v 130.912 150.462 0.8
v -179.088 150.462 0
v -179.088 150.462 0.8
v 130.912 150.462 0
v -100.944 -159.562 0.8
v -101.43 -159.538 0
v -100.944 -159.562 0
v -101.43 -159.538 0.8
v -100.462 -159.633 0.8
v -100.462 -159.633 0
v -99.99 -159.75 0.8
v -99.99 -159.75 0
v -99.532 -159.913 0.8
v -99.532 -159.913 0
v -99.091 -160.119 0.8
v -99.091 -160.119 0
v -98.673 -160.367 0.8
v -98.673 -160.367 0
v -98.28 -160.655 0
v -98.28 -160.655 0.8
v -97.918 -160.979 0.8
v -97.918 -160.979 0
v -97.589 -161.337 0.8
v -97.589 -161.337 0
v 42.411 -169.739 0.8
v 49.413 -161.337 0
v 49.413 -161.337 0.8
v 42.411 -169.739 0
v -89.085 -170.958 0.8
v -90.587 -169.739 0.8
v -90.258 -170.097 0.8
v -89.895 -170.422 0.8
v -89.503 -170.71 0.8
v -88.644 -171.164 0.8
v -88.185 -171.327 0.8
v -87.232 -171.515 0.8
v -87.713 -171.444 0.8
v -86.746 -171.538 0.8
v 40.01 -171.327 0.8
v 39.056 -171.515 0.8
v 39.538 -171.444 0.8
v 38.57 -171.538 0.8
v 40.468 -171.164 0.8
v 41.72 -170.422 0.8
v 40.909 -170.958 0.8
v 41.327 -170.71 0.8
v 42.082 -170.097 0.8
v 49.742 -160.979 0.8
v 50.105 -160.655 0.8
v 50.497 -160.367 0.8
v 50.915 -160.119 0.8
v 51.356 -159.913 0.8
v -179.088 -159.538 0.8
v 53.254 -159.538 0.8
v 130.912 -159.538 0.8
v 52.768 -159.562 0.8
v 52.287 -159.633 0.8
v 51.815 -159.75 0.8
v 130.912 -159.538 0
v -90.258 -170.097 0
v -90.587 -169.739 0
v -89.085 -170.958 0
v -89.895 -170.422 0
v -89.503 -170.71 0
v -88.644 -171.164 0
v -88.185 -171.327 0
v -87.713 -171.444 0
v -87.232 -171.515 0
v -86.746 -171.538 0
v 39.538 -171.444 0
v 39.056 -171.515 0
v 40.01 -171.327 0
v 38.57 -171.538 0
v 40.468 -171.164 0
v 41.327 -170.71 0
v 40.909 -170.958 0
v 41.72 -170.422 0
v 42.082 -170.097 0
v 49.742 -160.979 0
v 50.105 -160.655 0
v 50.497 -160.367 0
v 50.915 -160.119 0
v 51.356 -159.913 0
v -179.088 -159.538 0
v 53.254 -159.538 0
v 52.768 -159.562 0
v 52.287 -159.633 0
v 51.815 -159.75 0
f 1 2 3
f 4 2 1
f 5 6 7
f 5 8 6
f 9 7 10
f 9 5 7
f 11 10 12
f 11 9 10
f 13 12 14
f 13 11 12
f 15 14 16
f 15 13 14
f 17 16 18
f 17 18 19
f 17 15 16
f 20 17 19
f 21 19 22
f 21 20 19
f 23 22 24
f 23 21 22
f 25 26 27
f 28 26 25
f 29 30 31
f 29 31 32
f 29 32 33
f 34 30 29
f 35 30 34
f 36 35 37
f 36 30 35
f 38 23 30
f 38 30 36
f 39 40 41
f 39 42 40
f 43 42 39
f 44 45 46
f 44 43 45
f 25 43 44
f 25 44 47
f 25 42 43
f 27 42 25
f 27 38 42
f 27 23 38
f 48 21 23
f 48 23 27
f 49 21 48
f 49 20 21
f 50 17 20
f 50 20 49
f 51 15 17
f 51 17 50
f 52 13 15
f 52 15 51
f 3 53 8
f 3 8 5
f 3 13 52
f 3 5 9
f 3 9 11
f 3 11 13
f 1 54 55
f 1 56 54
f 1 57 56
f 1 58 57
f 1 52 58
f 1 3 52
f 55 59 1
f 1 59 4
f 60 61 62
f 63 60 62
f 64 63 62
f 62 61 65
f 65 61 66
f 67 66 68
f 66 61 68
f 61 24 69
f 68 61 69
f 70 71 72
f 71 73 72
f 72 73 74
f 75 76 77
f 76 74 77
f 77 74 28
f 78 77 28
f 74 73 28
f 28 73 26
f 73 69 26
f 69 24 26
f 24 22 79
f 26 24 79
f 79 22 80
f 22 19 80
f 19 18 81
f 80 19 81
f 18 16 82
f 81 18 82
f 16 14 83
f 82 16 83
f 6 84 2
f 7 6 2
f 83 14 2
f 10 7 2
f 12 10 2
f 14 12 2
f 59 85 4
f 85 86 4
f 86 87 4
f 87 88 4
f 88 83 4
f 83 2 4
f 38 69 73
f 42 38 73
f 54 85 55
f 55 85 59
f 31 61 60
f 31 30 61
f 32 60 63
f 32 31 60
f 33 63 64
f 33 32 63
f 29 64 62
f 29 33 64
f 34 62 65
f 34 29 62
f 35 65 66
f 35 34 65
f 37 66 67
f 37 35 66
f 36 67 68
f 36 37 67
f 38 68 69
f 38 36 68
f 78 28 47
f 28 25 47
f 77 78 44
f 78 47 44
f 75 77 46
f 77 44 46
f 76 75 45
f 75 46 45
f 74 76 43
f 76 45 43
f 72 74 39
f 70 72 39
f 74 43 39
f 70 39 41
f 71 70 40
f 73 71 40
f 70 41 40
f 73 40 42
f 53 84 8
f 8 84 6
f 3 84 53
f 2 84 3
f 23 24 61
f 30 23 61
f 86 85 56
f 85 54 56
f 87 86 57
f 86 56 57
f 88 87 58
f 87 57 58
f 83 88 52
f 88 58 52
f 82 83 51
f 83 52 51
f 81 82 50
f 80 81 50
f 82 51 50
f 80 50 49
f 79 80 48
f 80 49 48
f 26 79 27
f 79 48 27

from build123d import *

# Parameters (mm, degrees)
SKETCH_1_W          = 310
SKETCH_1_H          = 310
SKETCH_1_W_2        = 150
SKETCH_1_H_2        = 12
EXTRUDE_1_DEPTH     = 0.8
CUT_EXTRUDE_1_DEPTH = 0.8
FILLET_1_R          = 5


with BuildPart() as part:
    # 草图1 → 凸台-拉伸1 (new body)
    with BuildSketch(Plane.XY):
        with Locations((-24.087837838, -4.538288288)):
            Rectangle(SKETCH_1_W, SKETCH_1_H)
        with Locations((-24.087837838, -165.538288288)):
            Rectangle(SKETCH_1_W_2, SKETCH_1_H_2)
    extrude(amount=EXTRUDE_1_DEPTH)

    # 草图2 → 切除-拉伸1 (cut)
    with BuildSketch(Plane(origin=(0, 0, 0), x_dir=(-1, 0, 0), z_dir=(0, 0, -1))):
        Polygon((99.087837838, -159.538288288), (89.087837838, -171.538288288), (99.087837838, -171.538288288), align=None)
        Polygon((-50.912162162, -159.538288288), (-40.912162162, -171.538288288), (-50.912162162, -171.538288288), align=None)
    extrude(amount=-CUT_EXTRUDE_1_DEPTH, mode=Mode.SUBTRACT)

    # 圆角1
    fillet_1_edges = [part.edges().sort_by_distance(p)[0] for p in [
        (50.912162162, -159.538288288, 0.4),
        (-99.087837838, -159.538288288, 0.4),
        (-89.087837838, -171.538288288, 0.4),
        (40.912162162, -171.538288288, 0.4),
    ]]
    fillet(fillet_1_edges, radius=FILLET_1_R)


solid = part.part
